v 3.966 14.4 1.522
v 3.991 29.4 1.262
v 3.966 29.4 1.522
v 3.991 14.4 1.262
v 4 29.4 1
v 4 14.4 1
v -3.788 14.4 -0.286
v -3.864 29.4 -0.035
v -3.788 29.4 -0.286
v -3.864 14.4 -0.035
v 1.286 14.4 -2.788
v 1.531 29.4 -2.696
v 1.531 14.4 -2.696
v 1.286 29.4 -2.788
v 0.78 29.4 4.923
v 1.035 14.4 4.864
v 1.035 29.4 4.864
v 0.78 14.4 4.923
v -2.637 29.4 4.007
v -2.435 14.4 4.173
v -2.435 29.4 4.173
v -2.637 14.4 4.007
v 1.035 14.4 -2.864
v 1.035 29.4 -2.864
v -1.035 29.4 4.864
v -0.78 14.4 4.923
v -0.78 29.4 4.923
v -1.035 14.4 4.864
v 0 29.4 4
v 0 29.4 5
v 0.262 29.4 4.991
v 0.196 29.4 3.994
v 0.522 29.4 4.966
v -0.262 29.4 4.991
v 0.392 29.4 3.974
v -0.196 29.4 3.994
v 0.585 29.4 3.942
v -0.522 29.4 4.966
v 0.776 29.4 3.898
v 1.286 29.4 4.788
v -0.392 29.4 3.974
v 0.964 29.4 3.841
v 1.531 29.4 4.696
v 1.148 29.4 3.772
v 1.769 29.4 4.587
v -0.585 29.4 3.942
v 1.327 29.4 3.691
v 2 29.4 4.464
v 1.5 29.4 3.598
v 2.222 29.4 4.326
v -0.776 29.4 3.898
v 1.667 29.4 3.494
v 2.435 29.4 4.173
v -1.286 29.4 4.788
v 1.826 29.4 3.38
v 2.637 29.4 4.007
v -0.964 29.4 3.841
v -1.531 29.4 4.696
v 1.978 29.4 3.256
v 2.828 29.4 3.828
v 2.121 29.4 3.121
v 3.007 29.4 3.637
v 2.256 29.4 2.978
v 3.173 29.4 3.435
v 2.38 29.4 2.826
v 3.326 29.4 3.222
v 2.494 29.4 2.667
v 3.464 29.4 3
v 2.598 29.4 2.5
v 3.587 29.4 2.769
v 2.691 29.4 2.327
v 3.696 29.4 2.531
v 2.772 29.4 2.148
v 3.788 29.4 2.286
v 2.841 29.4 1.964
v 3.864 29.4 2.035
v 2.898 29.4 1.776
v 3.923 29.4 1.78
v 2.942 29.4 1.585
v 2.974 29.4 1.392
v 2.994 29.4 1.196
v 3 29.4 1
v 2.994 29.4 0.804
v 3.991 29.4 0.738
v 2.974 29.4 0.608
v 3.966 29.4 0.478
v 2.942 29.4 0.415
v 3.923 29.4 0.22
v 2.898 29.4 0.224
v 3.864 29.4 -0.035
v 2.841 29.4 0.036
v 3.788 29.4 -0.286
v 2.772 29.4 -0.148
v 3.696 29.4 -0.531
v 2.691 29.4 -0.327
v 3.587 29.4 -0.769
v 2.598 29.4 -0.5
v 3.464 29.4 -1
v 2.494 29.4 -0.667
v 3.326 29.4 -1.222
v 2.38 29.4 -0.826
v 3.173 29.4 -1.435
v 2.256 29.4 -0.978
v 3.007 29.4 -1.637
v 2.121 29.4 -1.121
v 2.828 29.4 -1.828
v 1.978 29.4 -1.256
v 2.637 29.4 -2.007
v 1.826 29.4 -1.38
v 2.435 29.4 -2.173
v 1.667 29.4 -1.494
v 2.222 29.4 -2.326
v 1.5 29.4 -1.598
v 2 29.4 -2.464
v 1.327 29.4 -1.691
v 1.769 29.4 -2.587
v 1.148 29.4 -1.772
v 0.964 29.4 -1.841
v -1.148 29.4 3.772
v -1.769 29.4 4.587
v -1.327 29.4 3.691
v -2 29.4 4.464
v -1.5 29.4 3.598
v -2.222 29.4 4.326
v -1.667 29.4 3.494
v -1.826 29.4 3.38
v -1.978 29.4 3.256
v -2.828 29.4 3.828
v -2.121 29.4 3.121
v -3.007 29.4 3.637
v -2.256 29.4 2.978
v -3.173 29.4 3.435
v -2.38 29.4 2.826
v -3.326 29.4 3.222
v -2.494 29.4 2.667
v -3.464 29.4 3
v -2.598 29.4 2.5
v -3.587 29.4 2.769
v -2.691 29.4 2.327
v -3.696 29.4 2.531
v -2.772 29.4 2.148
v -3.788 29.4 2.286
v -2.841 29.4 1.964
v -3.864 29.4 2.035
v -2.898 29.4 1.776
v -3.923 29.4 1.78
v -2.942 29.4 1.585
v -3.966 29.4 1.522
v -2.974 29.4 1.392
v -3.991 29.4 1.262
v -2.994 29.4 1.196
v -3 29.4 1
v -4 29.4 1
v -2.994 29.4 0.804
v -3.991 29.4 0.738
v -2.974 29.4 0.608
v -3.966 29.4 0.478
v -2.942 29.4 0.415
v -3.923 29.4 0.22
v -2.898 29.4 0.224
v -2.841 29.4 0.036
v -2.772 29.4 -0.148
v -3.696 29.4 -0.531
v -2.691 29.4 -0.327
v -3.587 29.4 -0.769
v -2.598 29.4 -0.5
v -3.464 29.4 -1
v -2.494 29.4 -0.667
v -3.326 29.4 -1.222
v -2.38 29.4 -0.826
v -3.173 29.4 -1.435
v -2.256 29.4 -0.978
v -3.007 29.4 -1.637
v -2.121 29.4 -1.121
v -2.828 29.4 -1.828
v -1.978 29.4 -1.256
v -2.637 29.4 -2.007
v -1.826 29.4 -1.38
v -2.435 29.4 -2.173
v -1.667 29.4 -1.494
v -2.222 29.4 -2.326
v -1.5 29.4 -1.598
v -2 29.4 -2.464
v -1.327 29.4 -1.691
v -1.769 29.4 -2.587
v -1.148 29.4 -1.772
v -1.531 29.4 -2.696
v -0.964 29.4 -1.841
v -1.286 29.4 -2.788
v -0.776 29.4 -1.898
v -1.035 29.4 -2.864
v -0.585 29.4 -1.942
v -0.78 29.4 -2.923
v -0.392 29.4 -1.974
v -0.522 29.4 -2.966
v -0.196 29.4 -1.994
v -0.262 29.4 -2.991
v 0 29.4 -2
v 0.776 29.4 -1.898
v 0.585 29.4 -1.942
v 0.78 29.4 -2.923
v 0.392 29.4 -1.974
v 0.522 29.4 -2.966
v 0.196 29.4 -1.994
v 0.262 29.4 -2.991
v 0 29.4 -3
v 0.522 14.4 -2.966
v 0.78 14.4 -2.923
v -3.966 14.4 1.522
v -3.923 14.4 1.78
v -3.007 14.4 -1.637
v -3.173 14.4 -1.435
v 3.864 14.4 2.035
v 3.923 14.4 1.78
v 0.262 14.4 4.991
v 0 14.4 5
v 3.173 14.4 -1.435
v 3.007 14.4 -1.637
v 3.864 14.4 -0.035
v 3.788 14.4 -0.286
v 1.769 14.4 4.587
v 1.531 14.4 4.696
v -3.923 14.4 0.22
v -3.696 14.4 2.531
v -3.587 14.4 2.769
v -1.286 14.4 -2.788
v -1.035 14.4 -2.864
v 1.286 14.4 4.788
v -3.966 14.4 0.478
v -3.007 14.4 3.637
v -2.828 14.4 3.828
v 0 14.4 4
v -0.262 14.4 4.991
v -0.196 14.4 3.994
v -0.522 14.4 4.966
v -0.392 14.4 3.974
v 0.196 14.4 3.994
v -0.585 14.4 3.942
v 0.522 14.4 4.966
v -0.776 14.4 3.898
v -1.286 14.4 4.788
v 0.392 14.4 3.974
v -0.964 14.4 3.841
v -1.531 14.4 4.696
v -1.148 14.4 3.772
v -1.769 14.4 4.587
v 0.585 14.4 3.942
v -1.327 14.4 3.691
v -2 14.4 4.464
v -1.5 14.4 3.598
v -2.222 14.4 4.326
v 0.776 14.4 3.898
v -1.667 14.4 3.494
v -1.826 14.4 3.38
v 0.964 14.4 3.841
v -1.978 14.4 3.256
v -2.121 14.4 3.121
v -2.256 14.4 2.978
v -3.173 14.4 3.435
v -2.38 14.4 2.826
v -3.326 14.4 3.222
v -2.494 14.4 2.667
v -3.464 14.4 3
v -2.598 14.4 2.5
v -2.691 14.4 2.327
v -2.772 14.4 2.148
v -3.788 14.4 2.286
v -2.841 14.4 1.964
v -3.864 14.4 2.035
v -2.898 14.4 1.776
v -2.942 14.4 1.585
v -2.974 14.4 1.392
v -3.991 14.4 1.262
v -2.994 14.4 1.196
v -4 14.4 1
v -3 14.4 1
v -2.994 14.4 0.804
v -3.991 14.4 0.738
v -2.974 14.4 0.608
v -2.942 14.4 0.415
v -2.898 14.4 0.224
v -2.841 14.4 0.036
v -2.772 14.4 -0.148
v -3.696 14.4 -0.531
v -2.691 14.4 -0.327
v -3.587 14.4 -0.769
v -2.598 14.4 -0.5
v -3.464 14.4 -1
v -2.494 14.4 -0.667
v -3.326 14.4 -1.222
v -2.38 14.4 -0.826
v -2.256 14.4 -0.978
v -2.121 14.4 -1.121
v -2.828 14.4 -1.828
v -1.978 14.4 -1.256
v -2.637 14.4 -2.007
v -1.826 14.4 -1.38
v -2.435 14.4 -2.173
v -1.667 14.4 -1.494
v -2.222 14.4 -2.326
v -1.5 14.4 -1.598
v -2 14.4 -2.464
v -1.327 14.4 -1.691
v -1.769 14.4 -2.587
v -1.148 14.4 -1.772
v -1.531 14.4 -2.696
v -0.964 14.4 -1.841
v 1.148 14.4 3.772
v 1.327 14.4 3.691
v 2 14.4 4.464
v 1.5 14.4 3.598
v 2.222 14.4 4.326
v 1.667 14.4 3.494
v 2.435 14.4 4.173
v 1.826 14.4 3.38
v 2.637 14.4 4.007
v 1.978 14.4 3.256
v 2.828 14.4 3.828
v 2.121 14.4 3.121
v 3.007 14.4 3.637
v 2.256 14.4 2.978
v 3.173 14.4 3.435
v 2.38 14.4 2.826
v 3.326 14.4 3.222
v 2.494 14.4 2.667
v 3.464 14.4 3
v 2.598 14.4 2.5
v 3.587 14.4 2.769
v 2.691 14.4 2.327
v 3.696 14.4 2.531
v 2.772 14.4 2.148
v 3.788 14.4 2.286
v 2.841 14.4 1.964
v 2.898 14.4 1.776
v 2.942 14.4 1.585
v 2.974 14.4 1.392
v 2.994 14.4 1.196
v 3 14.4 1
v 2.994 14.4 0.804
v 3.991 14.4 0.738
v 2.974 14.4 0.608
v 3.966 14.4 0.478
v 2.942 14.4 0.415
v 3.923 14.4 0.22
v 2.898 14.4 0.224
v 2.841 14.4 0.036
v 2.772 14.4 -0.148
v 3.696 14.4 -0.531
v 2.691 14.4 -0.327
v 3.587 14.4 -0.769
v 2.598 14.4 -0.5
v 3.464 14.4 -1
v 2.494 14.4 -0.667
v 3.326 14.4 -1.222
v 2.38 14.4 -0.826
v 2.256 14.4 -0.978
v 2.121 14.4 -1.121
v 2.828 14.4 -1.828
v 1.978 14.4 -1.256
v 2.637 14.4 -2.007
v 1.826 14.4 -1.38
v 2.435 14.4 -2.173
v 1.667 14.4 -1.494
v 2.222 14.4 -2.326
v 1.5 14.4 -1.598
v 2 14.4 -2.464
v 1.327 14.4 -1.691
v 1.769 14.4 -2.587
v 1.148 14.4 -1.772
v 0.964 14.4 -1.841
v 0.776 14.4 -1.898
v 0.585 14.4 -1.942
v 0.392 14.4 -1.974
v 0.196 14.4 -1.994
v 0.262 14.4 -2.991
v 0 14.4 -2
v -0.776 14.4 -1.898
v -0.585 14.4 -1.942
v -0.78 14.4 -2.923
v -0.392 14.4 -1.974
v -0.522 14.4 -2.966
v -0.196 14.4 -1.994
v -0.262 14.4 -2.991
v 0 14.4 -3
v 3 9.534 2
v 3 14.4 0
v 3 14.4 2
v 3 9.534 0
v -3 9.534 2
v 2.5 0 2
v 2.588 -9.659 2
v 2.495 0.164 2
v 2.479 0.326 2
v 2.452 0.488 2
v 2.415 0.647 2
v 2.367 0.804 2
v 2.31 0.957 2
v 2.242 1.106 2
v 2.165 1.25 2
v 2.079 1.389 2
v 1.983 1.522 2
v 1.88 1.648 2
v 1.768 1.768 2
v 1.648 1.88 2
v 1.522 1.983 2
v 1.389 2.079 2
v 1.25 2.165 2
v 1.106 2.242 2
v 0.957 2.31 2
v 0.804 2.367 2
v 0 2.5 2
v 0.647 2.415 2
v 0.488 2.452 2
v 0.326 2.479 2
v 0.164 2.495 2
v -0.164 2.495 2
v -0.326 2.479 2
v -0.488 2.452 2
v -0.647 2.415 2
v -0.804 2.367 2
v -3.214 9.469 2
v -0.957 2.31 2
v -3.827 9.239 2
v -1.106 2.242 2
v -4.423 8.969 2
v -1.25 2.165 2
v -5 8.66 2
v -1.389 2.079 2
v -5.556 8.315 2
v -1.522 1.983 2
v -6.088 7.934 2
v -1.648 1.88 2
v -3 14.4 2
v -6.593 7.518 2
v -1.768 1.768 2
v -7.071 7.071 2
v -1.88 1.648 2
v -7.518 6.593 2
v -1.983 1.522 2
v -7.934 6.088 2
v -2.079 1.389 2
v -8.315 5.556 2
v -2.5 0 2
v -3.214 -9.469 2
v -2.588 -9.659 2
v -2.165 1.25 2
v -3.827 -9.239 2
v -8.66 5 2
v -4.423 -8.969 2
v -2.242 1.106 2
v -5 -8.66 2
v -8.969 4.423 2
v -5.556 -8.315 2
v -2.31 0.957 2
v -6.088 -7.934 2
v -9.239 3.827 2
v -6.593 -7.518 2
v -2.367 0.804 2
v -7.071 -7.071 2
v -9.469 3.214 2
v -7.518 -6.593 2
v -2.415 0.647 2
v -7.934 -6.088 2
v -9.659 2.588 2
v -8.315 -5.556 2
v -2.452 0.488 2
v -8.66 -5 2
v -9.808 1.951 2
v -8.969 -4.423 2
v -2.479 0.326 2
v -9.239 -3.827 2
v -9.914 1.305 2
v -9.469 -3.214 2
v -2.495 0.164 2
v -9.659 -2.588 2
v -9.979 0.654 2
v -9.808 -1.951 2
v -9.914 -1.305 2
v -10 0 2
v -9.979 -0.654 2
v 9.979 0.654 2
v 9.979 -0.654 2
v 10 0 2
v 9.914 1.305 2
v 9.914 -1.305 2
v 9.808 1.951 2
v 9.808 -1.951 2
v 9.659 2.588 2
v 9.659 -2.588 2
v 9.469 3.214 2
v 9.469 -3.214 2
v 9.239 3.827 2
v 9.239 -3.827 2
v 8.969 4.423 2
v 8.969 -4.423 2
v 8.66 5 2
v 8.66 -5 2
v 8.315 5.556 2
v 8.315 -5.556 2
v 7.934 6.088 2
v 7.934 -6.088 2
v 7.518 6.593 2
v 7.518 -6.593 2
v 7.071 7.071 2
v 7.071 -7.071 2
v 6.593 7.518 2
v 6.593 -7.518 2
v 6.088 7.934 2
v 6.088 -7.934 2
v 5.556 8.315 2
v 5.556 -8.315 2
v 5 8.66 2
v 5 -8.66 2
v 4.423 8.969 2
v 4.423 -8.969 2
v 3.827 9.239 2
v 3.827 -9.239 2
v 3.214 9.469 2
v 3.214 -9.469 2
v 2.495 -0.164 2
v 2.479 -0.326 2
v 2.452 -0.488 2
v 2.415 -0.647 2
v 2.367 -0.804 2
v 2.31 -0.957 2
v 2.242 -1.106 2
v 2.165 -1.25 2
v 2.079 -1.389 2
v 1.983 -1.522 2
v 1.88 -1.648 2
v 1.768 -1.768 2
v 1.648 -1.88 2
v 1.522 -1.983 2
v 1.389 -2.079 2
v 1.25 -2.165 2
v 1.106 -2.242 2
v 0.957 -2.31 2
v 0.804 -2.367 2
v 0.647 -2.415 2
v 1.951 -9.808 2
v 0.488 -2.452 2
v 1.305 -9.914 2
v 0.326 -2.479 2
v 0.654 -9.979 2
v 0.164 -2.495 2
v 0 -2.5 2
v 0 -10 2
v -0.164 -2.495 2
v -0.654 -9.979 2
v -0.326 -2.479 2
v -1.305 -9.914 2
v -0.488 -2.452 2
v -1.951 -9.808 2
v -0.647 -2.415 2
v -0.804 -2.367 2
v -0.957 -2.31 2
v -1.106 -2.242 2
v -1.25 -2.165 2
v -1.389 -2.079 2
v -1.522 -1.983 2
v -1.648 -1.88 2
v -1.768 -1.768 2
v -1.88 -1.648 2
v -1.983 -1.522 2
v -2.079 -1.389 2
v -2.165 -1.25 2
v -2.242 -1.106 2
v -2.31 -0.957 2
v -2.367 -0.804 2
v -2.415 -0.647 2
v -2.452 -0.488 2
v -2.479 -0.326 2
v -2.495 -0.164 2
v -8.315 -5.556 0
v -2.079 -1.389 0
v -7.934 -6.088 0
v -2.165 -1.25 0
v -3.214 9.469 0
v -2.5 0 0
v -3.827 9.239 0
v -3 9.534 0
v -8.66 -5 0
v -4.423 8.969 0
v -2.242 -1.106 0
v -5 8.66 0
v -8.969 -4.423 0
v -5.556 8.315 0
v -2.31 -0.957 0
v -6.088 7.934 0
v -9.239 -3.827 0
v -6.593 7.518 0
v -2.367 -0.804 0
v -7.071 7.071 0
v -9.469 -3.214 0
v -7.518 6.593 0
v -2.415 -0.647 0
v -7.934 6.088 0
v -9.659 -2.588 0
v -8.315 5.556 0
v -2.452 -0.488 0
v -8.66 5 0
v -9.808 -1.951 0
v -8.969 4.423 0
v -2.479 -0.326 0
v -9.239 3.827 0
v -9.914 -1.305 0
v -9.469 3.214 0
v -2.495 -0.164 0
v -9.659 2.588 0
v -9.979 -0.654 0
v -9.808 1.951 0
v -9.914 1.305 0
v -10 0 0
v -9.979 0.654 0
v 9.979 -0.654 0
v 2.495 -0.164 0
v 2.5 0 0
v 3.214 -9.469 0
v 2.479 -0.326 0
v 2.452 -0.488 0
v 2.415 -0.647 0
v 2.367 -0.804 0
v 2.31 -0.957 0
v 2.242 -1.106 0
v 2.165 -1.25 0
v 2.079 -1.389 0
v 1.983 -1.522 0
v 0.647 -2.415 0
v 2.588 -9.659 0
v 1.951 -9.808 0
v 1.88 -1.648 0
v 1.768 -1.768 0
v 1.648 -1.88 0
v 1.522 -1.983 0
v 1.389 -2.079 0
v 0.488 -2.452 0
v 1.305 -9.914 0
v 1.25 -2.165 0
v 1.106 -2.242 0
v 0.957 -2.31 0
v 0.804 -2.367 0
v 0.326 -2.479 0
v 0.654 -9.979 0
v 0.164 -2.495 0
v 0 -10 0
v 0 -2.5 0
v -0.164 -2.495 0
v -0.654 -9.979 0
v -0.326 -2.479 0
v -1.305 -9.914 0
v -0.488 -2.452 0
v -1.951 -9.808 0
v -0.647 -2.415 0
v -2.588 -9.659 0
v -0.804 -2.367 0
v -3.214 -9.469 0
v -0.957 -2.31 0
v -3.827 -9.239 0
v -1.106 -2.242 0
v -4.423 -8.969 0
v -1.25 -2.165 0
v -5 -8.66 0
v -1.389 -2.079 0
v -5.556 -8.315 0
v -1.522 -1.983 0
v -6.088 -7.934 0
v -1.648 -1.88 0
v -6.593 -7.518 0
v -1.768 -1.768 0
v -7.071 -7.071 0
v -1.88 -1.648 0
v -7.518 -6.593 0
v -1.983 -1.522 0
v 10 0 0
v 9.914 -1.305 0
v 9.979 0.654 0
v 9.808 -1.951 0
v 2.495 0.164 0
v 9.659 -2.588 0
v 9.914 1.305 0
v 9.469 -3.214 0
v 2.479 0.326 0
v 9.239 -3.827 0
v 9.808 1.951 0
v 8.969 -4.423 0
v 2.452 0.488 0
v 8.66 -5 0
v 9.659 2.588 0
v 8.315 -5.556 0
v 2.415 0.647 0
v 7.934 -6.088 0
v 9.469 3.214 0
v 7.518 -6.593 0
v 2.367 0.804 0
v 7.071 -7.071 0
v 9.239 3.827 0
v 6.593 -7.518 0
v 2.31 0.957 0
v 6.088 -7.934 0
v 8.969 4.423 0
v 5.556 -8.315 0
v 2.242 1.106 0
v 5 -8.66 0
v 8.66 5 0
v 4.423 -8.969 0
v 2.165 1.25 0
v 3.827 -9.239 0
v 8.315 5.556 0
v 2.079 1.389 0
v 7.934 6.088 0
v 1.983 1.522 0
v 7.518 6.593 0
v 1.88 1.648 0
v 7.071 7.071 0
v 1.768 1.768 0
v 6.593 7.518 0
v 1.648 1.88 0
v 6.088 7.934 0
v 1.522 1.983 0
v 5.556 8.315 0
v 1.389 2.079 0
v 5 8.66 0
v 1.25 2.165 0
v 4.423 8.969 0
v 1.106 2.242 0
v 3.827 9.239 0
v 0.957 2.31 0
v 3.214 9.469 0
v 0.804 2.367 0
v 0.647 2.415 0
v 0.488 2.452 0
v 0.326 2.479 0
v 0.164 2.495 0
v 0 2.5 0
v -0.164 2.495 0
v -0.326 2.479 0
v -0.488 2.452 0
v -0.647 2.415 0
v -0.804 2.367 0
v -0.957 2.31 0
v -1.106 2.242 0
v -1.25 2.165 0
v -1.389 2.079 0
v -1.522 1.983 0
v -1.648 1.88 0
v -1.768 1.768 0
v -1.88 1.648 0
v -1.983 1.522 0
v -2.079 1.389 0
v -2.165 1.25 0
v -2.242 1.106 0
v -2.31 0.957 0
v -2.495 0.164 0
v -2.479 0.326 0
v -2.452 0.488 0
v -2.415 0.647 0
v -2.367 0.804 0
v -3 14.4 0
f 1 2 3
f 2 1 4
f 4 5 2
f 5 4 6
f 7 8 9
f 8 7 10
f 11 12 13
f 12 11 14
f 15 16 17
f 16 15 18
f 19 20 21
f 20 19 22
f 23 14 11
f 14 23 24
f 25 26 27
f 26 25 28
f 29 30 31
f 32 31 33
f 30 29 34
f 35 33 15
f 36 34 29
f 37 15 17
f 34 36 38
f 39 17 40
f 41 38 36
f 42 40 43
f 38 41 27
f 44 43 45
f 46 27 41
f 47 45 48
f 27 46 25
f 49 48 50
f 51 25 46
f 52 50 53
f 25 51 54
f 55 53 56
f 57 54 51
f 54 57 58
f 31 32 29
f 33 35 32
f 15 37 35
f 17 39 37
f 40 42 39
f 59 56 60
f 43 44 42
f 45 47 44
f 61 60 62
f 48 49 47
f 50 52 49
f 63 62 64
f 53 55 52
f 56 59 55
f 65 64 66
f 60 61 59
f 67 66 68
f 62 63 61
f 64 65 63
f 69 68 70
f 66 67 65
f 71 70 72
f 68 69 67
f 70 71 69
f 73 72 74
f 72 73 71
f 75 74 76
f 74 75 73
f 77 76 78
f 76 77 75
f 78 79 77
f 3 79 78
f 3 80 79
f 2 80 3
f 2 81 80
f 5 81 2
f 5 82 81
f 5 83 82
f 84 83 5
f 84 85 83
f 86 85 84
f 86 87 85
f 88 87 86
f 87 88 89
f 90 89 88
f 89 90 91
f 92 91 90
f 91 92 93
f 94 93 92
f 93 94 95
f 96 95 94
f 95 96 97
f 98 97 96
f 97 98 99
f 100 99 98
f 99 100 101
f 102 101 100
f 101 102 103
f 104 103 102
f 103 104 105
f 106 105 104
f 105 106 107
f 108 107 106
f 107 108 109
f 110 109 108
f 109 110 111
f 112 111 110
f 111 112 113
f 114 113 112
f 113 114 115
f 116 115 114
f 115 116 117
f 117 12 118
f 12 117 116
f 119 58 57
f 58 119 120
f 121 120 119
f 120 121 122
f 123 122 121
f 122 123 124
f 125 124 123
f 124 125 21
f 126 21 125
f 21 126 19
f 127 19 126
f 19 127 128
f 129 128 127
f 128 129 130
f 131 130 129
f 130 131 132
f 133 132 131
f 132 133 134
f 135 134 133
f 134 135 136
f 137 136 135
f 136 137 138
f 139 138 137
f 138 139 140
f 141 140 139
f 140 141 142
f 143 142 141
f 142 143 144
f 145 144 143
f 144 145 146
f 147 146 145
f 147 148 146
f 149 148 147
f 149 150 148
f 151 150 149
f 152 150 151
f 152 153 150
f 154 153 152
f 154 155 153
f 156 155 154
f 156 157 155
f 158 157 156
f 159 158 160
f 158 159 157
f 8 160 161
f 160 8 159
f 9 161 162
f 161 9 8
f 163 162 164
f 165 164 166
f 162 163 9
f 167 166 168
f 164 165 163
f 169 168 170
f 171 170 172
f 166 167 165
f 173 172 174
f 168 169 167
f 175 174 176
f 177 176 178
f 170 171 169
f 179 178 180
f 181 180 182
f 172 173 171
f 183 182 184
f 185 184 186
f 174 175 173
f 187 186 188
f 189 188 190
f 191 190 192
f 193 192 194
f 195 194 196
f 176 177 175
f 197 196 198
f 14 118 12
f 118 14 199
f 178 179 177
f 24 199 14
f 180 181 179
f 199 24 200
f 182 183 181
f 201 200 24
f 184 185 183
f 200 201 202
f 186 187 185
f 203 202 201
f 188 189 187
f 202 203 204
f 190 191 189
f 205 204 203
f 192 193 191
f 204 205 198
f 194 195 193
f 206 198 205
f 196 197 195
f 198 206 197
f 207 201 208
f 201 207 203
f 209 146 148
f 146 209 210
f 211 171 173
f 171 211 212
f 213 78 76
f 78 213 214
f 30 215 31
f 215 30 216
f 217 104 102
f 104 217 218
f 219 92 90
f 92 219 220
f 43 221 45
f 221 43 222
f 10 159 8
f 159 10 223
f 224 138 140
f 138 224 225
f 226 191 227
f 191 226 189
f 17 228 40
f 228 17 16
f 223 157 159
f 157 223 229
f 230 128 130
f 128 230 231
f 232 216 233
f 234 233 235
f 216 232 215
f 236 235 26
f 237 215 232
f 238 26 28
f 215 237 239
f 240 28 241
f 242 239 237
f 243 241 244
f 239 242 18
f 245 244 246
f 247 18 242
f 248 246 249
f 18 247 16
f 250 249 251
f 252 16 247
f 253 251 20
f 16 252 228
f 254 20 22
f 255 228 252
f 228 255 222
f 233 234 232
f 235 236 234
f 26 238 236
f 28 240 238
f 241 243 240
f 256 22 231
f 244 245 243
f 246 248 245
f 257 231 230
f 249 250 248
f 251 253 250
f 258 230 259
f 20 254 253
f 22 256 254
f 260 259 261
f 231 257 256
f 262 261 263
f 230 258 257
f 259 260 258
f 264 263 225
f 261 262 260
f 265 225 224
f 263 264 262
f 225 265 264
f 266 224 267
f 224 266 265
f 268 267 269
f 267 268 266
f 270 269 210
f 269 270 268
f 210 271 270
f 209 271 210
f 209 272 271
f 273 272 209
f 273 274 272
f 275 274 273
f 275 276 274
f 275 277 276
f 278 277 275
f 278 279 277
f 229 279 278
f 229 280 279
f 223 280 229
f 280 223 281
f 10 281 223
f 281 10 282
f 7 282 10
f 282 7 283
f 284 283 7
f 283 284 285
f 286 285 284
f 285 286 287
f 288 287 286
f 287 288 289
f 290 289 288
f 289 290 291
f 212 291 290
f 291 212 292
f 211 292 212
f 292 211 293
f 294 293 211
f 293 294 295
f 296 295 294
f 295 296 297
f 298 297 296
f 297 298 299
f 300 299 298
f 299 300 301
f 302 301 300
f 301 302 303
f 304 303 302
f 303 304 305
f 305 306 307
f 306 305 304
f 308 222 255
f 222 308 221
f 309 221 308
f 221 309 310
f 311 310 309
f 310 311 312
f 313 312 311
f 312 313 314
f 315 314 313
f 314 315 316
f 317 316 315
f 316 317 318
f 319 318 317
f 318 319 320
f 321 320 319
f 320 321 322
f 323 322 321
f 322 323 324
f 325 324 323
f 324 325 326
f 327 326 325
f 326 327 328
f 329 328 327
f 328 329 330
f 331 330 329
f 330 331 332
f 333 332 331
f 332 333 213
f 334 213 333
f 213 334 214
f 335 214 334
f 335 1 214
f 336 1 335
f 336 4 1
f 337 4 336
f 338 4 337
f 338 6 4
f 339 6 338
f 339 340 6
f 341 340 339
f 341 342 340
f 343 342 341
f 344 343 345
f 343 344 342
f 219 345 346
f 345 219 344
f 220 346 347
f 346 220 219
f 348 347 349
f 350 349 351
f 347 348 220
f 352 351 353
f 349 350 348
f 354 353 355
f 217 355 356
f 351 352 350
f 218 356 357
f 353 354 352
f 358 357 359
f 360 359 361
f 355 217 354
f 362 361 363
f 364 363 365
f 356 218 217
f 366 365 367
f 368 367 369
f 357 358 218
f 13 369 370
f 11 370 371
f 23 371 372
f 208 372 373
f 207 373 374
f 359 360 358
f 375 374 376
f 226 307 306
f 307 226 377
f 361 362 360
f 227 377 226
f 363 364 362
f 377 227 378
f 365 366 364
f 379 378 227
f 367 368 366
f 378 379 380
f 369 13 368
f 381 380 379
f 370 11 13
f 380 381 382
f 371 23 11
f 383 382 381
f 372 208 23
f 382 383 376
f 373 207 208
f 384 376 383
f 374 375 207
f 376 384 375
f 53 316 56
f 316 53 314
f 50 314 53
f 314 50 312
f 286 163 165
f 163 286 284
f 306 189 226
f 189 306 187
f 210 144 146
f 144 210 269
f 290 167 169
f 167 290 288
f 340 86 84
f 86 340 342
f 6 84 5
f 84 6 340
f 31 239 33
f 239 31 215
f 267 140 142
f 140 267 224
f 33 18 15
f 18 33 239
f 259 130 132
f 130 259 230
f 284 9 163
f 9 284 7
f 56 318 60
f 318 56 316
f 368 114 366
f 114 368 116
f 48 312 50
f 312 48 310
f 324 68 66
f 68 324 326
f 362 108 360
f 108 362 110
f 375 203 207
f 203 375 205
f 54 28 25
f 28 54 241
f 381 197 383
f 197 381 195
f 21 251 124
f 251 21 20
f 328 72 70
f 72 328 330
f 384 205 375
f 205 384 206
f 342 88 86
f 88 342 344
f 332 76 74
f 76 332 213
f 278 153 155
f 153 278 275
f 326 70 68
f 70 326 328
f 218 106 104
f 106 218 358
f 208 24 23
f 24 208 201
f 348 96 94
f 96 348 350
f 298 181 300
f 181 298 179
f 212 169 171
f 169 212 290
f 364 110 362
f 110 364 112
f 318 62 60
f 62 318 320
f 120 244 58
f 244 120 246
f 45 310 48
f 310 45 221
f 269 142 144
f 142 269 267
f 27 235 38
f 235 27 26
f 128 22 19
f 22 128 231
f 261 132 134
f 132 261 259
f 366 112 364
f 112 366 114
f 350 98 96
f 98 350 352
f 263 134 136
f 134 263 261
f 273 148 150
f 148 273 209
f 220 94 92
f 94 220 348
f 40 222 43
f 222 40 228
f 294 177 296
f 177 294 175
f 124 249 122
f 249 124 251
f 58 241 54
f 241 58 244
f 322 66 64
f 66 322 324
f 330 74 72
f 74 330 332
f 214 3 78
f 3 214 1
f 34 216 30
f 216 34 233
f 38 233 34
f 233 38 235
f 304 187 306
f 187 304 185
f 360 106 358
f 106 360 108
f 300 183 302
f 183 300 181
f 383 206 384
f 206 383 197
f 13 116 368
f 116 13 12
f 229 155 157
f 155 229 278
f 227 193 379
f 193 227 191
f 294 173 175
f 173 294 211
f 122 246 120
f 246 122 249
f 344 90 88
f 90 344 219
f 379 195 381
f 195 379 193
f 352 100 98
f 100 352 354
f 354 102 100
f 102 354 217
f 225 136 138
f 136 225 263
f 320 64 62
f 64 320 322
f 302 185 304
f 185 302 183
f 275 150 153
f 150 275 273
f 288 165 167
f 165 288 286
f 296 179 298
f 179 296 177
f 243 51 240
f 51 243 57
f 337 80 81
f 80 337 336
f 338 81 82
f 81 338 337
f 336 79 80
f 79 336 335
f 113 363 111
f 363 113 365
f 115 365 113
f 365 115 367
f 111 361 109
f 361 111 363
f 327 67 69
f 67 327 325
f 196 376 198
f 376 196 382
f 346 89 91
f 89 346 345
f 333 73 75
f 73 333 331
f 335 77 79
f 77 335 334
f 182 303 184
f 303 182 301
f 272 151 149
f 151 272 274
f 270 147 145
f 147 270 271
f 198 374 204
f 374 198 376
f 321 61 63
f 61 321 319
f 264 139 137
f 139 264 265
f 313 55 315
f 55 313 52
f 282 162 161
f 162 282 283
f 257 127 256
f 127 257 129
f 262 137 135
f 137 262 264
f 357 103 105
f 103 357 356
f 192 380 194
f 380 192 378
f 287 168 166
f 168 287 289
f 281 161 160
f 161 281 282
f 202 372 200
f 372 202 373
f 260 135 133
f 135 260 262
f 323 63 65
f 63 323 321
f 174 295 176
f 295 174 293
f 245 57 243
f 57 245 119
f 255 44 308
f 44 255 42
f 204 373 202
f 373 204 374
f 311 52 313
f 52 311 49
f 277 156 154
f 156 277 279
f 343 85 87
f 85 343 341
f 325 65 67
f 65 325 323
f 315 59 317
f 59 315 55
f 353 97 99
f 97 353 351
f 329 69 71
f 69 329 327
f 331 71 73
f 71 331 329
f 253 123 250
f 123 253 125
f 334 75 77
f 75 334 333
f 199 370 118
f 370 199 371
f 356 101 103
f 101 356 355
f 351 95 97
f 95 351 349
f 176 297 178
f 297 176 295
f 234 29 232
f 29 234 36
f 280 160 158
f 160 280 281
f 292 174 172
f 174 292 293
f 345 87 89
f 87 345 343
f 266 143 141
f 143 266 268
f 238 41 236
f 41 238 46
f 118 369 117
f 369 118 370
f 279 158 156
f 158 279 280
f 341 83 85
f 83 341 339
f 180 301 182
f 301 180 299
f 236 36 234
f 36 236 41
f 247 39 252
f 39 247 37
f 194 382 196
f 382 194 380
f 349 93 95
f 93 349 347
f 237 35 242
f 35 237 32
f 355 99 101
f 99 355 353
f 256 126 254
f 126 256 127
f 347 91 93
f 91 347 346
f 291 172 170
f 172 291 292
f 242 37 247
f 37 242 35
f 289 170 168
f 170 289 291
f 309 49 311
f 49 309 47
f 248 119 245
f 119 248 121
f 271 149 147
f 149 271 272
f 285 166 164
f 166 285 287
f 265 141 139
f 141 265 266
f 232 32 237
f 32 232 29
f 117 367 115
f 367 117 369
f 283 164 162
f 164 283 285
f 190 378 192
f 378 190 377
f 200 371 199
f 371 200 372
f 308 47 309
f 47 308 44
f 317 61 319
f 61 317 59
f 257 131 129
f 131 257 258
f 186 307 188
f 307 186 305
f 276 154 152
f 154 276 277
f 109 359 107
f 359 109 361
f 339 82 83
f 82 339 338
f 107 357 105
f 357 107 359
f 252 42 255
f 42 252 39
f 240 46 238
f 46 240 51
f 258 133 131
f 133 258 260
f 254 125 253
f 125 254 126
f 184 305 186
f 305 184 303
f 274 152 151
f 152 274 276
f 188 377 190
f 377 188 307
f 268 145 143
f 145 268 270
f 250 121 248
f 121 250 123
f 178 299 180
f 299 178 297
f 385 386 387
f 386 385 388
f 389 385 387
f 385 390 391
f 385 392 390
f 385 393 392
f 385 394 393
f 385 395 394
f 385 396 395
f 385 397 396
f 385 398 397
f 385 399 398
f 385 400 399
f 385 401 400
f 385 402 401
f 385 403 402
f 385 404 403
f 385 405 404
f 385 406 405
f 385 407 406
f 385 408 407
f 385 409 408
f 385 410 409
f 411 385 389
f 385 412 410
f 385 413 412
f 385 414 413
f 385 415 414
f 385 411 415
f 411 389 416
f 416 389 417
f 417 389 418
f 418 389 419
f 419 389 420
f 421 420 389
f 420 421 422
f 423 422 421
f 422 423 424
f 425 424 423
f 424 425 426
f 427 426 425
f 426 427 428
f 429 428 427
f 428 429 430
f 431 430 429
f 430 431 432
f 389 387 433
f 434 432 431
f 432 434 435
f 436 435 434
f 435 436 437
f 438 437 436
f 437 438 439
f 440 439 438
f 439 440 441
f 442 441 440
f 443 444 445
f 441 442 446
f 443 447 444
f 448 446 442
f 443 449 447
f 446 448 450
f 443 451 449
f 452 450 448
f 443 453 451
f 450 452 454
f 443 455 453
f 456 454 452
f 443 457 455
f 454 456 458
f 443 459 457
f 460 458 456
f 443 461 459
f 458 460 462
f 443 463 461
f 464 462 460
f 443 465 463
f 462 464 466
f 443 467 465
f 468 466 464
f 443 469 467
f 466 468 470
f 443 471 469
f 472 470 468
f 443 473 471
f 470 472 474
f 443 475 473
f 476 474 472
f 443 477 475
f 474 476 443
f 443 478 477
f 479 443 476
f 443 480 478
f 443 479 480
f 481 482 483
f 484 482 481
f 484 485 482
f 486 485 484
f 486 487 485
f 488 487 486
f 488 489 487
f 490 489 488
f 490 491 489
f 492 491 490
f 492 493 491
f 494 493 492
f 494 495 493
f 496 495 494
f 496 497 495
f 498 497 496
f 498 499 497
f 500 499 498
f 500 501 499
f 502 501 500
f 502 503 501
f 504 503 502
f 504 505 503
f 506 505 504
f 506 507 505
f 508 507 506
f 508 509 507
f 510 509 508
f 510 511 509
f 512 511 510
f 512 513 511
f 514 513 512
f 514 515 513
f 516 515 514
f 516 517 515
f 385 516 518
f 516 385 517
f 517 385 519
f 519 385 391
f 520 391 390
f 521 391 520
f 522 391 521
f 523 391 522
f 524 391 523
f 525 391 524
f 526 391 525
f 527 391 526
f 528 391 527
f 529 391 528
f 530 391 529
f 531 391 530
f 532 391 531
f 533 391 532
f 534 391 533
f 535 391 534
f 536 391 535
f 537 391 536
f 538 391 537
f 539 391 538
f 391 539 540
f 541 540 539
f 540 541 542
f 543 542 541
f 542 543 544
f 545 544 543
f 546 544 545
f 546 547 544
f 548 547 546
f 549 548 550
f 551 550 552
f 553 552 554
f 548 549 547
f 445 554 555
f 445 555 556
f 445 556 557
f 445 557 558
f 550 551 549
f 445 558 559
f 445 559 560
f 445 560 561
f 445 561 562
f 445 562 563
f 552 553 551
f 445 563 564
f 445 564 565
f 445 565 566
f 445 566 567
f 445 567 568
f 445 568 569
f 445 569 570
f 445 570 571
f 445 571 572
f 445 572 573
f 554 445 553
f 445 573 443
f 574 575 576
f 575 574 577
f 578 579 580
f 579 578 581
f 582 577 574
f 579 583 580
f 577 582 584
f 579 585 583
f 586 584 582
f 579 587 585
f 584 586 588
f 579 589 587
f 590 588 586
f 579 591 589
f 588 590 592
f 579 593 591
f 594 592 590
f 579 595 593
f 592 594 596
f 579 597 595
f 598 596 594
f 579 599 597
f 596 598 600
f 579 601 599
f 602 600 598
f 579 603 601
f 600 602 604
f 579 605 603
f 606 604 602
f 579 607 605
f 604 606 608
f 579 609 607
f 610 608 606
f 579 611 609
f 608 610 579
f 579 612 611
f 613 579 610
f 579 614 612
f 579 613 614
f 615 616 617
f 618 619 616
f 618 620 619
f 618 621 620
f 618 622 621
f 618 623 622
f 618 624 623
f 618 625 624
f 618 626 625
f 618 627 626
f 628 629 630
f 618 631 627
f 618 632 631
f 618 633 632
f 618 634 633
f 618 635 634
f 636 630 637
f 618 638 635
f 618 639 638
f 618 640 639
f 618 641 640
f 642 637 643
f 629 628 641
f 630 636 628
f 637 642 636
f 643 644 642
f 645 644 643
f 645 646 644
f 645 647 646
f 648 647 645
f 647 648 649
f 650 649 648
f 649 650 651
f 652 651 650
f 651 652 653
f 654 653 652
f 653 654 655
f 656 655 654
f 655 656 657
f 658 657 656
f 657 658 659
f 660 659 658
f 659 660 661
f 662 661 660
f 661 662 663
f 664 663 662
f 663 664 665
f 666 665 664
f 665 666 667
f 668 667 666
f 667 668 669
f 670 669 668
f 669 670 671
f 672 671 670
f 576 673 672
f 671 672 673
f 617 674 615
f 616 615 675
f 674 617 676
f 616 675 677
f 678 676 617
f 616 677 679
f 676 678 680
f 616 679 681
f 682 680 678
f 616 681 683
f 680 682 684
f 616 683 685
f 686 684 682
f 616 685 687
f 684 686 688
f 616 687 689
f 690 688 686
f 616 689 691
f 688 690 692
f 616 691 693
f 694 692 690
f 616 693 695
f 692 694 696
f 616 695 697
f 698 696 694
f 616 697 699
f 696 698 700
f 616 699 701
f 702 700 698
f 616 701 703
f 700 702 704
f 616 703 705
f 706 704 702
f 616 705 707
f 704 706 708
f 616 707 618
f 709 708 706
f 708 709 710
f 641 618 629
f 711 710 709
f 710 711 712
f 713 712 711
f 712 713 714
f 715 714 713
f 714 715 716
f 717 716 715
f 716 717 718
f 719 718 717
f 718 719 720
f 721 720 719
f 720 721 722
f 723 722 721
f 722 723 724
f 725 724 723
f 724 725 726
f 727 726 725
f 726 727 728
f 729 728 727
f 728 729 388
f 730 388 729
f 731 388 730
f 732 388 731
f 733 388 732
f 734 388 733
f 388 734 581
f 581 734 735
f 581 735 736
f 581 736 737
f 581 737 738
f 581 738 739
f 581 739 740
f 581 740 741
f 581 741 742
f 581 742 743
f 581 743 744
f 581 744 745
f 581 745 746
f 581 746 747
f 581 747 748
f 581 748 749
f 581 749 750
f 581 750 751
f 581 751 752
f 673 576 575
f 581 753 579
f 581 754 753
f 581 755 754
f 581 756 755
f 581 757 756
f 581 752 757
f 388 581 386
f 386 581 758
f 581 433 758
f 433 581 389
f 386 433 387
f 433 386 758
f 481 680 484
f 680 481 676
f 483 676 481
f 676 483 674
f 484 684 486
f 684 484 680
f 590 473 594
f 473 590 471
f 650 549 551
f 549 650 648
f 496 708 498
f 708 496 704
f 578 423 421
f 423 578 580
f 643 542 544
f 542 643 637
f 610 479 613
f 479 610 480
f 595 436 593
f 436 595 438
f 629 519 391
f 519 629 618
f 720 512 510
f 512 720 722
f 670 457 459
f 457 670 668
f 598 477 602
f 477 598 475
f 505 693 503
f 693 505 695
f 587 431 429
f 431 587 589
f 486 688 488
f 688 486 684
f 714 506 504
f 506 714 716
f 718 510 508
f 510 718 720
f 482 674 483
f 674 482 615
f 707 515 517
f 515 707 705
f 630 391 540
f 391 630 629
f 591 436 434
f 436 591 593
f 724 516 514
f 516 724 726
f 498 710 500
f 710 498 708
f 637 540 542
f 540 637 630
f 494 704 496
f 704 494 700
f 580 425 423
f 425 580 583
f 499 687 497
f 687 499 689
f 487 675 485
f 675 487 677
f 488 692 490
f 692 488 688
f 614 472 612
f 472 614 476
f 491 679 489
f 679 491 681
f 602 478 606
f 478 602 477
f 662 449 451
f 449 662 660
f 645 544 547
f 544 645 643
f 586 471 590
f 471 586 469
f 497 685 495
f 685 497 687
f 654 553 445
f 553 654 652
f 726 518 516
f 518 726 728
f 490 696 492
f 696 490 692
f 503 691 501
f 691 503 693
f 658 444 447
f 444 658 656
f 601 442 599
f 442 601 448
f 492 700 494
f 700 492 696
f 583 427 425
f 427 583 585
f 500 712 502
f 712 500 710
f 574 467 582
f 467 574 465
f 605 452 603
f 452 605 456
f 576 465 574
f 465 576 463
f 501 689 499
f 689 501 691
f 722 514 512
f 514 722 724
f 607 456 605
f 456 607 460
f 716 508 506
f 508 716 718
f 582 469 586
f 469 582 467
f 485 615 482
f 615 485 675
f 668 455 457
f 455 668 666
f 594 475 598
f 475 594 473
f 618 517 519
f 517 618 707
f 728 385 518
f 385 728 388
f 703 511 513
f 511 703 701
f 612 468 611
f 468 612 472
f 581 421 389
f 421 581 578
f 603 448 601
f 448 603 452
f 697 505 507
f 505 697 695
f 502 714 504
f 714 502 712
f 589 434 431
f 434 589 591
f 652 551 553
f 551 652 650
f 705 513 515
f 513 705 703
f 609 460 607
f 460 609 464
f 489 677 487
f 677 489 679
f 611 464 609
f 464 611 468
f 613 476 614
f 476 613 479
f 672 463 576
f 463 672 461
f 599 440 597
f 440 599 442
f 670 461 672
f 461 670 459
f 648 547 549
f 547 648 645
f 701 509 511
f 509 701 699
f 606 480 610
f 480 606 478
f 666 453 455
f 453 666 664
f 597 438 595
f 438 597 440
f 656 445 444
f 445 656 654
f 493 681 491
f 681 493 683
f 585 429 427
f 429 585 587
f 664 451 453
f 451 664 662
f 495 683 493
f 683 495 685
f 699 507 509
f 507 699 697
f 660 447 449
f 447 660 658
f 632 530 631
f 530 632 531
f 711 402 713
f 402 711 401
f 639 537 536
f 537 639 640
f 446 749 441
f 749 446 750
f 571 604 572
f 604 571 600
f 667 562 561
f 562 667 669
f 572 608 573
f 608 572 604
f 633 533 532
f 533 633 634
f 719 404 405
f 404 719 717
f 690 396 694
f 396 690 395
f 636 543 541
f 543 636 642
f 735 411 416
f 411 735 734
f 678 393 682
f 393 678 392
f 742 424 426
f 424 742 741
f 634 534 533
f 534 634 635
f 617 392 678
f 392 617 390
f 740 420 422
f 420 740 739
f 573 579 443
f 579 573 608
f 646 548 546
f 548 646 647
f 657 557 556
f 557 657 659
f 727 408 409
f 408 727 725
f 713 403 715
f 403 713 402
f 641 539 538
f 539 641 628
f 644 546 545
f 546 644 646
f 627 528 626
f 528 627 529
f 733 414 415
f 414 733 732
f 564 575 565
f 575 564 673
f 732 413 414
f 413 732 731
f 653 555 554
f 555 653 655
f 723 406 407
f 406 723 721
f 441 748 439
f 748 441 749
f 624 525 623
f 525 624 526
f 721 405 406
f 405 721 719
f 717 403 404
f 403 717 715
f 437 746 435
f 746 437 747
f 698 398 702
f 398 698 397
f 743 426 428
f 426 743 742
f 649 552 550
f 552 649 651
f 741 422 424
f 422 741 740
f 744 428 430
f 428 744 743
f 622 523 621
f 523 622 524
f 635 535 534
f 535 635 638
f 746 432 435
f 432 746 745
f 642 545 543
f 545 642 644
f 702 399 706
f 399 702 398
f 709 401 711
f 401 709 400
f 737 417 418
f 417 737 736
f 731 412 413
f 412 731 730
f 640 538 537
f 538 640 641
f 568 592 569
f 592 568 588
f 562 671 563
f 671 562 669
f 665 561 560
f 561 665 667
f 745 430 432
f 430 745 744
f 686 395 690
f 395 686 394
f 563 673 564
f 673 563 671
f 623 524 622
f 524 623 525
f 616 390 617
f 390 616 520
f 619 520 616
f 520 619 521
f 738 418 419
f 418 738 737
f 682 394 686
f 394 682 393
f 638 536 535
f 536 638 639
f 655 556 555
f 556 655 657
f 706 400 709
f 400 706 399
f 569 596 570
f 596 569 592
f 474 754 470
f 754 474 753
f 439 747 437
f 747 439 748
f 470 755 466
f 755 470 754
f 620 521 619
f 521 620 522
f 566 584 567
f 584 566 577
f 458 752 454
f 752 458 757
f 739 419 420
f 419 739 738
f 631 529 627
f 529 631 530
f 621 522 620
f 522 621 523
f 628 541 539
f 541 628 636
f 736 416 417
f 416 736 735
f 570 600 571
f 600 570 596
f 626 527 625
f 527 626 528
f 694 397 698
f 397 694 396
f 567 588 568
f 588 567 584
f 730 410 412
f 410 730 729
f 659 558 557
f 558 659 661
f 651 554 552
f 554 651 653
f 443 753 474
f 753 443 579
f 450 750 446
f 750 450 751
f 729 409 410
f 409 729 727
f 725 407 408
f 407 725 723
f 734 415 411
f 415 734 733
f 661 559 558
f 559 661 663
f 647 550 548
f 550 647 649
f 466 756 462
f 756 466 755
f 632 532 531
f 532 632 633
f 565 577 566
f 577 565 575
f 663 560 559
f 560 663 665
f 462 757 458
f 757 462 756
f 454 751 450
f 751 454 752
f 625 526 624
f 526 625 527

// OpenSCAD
// Parameters
terminal_type = "crimp"; // Options: "crimp", "bent"
ring_diameter = 20;      // Outer diameter of the ring pad
hole_diameter = 5;       // Diameter of the central bolt hole
barrel_length = 15;      // Length of the crimp barrel
barrel_diameter = 8;     // Outer diameter of the crimp barrel
bent_length = 20;        // Length of the bent tongue
bent_width = 10;         // Width of the bent tongue
neck_length = 5;         // Length of the transition neck
neck_width = 6;          // Width of the transition neck

// Added/derived parameters
pad_thickness = 2;
part_thickness = pad_thickness; // keep consistent thickness for pad/neck/tongue
overlap = 0.6;                  // small overlap to guarantee connectivity
$fn = 96;

// Main assembly (single connected solid with a hole)
module ring_terminal_assembly() {
    difference() {
        union() {
            ring_pad_solid();
            wire_termination_solid();
        }
        // Central bolt hole through the pad
        translate([0, 0, -1])
            cylinder(h = pad_thickness + 2, d = hole_diameter);
    }
}

// Ring pad (solid; hole cut in assembly)
module ring_pad_solid() {
    cylinder(h = pad_thickness, d = ring_diameter);
}

// Wire termination section connected to pad edge via neck
module wire_termination_solid() {
    // Place neck so its near end overlaps into the pad edge
    // Pad spans z=[0..pad_thickness], neck is centered at z=pad_thickness/2
    // Pad radius = ring_diameter/2, neck extends along +Y
    translate([0, ring_diameter/2 + neck_length/2 - overlap, pad_thickness/2])
        transition_neck_solid();

    // Attach termination to far end of neck (also overlapping slightly)
    if (terminal_type == "crimp") {
        // Barrel axis along +Y, centered at pad mid-thickness
        translate([0,
                   ring_diameter/2 + neck_length - overlap + barrel_length/2,
                   pad_thickness/2])
            crimp_barrel_solid();
    } else if (terminal_type == "bent") {
        translate([0,
                   ring_diameter/2 + neck_length - overlap + bent_length/2,
                   pad_thickness/2])
            bent_tongue_solid();
    }
}

// Transition neck (rectangular strap)
module transition_neck_solid() {
    cube([neck_width, neck_length, part_thickness], center = true);
}

// Crimp barrel (tube-like barrel with inner bore)
module crimp_barrel_solid() {
    inner_d = max(0.1, barrel_diameter - 2.0); // simple wall thickness ~1mm
    rotate([90, 0, 0])  // make cylinder axis along Y
        difference() {
            cylinder(h = barrel_length, d = barrel_diameter, center = true);
            cylinder(h = barrel_length + 2, d = inner_d, center = true);
        }
}

// Bent tongue (flat strap)
module bent_tongue_solid() {
    cube([bent_width, bent_length, part_thickness], center = true);
}

// Render
ring_terminal_assembly();
